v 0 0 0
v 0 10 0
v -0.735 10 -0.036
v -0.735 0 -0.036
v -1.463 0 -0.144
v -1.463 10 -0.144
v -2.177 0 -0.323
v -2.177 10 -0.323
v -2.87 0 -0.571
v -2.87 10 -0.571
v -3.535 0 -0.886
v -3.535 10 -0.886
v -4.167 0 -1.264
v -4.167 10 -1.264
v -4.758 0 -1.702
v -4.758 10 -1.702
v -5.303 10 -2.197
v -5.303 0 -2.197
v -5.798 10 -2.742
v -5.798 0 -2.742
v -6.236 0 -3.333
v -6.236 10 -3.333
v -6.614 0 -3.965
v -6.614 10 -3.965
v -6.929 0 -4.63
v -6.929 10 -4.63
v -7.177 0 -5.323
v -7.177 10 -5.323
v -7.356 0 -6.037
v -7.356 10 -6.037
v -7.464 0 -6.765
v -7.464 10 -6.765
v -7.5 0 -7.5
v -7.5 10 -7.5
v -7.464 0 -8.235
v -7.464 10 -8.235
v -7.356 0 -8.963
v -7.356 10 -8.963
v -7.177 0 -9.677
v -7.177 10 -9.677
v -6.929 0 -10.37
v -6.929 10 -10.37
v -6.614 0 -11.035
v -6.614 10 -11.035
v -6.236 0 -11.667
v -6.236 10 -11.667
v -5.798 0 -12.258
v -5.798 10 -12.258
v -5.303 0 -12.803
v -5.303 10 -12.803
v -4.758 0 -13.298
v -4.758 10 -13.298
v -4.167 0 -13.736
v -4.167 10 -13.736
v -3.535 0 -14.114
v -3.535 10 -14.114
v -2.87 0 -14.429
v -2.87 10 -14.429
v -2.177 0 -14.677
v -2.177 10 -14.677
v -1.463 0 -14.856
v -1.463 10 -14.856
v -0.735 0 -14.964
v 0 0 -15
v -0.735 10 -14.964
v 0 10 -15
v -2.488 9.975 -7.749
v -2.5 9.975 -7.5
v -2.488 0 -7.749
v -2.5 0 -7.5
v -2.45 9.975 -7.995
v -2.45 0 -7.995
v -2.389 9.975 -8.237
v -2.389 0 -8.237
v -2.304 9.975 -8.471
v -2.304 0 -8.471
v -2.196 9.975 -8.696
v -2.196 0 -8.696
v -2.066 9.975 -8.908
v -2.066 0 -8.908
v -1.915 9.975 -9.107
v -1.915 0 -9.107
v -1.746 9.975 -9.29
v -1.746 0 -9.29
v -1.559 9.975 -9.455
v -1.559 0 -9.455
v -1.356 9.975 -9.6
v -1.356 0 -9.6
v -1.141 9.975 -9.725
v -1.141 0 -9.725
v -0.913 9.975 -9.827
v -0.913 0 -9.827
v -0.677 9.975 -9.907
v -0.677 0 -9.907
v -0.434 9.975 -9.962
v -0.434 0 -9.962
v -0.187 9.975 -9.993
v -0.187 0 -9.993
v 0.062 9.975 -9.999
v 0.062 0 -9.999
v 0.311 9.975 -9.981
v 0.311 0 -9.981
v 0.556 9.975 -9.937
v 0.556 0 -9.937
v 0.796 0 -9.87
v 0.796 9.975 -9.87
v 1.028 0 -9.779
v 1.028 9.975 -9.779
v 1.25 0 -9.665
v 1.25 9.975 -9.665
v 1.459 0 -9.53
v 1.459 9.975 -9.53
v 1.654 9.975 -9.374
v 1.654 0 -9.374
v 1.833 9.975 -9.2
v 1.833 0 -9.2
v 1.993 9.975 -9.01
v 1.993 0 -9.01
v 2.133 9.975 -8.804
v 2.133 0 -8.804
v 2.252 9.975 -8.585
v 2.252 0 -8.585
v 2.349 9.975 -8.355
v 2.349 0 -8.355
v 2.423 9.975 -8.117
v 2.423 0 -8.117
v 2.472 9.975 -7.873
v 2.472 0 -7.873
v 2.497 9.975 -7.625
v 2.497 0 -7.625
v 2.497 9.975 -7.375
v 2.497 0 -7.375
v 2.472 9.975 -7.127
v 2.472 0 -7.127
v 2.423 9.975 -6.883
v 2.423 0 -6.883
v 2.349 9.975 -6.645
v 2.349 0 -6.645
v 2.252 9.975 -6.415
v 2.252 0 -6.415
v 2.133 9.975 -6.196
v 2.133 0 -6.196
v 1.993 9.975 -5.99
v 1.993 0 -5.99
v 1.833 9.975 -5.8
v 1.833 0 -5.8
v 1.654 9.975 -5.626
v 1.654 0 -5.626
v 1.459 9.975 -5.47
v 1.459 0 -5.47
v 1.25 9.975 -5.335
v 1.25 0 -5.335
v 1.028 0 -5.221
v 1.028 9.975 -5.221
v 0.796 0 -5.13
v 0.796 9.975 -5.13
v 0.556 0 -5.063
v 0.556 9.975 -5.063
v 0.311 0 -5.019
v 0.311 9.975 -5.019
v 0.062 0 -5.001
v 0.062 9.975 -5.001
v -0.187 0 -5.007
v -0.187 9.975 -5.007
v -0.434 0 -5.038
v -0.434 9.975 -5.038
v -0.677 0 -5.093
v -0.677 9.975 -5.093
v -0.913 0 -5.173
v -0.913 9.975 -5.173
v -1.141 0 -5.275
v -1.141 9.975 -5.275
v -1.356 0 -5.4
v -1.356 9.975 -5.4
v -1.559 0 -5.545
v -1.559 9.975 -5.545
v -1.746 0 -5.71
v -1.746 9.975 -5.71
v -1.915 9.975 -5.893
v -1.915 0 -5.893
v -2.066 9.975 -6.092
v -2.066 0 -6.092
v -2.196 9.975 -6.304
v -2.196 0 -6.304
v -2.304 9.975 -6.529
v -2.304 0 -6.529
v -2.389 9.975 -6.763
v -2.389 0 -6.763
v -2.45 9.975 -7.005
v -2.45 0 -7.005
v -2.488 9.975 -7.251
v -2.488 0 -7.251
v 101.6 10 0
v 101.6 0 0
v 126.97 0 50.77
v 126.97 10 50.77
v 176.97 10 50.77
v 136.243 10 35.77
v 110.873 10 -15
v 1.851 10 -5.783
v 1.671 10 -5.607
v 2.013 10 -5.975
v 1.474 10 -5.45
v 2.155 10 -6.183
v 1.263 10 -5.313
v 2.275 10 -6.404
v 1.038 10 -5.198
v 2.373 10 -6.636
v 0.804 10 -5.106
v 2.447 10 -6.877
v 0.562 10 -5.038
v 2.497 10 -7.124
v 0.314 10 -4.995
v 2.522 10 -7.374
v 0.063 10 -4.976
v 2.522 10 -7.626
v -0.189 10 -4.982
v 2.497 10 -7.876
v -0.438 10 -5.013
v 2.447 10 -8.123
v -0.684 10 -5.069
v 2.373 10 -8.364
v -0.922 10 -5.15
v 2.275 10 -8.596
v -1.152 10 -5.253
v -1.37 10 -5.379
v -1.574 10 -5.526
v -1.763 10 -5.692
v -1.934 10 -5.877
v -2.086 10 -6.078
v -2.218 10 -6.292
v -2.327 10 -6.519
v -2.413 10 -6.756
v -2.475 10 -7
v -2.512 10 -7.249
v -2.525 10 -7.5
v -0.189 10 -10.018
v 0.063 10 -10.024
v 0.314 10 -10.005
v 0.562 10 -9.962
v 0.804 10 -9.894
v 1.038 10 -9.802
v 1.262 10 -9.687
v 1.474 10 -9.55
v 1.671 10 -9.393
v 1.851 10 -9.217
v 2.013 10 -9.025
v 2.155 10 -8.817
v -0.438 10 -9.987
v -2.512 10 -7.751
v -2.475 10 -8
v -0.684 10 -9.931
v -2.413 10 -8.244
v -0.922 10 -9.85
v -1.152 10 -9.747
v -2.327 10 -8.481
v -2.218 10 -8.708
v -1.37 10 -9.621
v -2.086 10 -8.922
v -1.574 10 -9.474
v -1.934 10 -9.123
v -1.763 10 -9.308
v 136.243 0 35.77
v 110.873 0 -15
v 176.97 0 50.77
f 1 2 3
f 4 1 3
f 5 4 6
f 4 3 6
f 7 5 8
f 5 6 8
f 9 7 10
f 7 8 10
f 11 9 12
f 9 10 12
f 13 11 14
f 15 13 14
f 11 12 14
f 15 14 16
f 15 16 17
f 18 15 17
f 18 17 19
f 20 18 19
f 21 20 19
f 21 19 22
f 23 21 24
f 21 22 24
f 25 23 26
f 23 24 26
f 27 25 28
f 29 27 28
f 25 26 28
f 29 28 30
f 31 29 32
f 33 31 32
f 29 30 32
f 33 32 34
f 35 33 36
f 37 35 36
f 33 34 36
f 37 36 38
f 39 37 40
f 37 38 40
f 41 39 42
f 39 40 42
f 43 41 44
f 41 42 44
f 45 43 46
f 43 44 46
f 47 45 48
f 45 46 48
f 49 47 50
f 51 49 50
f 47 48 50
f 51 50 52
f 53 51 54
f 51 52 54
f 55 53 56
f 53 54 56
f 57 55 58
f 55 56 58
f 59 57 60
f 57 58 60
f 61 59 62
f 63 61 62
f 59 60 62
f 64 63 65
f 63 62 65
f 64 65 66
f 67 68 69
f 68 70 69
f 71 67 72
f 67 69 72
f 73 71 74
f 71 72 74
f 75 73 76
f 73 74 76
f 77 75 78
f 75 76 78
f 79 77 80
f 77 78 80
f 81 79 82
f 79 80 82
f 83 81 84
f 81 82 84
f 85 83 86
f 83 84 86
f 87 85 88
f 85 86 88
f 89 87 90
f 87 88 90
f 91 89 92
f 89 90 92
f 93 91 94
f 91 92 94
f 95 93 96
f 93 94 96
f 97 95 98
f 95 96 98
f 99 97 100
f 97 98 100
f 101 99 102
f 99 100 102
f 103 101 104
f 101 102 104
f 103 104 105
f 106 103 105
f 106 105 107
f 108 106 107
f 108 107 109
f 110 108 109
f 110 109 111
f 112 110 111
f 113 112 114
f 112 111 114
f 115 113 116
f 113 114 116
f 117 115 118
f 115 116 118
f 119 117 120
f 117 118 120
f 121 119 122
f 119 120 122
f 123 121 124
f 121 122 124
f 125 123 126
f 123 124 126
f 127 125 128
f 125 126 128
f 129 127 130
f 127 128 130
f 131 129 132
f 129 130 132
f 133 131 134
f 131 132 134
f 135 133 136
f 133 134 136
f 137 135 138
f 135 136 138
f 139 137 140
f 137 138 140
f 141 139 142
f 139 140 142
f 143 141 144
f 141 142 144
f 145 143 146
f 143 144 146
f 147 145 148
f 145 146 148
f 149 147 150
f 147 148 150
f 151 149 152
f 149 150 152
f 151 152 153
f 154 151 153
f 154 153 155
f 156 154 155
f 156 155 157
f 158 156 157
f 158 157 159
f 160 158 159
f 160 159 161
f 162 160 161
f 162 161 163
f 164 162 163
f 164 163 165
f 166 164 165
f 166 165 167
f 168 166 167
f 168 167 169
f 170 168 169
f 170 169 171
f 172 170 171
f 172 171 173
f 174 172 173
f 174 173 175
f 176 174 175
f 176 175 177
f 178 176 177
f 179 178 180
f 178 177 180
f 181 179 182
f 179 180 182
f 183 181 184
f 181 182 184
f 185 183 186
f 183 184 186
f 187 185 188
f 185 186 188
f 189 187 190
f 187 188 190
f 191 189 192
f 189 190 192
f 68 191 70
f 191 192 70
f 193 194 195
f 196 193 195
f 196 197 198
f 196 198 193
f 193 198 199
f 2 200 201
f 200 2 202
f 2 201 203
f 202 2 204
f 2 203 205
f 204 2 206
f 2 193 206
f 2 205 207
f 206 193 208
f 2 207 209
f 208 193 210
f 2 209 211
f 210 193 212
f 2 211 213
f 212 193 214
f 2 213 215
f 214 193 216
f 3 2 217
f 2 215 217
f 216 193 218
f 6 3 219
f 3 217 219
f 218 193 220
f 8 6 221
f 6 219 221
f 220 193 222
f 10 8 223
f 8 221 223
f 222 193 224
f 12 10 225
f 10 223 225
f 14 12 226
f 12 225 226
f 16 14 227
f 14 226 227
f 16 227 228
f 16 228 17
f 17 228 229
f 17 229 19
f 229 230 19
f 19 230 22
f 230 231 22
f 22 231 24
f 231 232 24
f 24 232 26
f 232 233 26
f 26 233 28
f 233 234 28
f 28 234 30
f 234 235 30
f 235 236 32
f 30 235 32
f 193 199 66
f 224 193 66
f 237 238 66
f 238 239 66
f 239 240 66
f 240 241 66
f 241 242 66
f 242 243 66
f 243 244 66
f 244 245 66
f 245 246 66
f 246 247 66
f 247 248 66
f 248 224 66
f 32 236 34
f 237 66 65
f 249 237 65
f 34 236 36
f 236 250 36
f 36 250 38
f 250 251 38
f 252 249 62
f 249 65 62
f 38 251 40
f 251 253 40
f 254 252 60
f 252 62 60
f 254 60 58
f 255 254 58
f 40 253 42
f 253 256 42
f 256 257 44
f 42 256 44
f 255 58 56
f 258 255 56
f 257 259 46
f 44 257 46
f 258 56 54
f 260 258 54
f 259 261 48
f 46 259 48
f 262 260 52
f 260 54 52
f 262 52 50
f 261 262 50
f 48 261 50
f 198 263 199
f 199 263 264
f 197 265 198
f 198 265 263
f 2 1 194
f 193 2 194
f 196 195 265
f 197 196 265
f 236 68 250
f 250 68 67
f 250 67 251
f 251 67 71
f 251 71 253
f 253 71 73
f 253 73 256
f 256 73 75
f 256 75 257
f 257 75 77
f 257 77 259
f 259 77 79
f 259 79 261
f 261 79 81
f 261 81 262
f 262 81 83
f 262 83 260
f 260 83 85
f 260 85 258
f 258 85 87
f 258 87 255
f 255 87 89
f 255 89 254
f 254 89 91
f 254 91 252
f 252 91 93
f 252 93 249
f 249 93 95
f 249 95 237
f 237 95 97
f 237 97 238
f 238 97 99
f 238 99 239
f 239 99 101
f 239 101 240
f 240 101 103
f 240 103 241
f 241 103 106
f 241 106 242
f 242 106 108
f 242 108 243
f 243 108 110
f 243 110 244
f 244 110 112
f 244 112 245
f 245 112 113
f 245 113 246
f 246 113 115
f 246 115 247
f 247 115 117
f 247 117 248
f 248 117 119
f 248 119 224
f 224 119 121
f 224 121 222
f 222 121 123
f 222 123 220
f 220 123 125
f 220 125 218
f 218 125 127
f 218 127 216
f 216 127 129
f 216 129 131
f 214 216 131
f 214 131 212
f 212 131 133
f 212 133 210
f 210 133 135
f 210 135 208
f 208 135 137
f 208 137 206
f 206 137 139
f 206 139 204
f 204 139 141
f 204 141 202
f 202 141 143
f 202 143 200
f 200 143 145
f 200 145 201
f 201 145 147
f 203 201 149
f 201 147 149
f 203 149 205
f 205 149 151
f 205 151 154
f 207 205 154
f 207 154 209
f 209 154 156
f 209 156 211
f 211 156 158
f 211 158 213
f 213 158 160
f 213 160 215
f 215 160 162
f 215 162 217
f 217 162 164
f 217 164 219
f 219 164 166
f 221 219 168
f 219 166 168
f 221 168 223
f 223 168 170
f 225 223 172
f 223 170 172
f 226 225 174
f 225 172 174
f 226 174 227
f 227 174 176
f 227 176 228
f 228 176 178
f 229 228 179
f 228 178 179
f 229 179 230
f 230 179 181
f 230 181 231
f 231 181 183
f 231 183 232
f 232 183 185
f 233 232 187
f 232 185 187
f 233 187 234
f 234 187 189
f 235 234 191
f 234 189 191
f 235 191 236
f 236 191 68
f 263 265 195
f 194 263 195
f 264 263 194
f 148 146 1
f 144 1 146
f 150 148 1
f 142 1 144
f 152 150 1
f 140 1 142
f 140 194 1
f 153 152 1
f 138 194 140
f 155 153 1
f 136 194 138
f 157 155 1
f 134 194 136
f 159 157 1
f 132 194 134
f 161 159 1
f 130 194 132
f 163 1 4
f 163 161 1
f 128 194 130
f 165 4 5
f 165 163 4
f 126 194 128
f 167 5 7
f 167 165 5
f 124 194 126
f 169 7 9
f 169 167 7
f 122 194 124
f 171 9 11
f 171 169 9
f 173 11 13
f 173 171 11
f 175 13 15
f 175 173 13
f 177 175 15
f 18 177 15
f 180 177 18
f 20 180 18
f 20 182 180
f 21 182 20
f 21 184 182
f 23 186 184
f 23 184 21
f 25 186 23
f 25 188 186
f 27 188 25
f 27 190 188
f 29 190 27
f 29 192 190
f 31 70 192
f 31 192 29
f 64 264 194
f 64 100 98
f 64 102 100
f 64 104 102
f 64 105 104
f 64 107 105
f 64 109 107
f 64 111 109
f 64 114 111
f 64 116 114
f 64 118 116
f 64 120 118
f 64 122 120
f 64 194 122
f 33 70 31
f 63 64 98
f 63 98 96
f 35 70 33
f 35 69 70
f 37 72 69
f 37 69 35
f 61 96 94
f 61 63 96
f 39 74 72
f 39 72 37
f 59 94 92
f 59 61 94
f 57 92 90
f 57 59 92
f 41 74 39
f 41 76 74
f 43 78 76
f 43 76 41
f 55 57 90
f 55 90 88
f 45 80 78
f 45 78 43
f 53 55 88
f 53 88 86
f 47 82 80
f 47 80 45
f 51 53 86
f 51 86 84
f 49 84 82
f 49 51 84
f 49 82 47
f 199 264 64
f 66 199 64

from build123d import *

# Parameters (mm, degrees)
BOSS_EXTRUDE1_DEPTH             = 10
BOSS_EXTRUDE2_DEPTH             = 10
F_5_0MM_DOWEL_HOLE2_D           = 5
F_5_0MM_DOWEL_HOLE2_CSINK_D     = 5.05
F_5_0MM_DOWEL_HOLE2_CSINK_ANGLE = 90


with BuildPart() as part:
    # Sketch1 → Boss-Extrude1 (new body)
    with BuildSketch(Plane(origin=(0, 0, 0), x_dir=(1, 0, 0), z_dir=(0, 1, 0))):
        Polygon((0, 0), (101.6, 0), (126.970266889, -50.770266889), (176.970266889, -50.770266889), (136.243205185, -35.770266889), (110.872938296, 15), (0, 15), align=None)
    extrude(amount=BOSS_EXTRUDE1_DEPTH)

    # Sketch2 → Boss-Extrude2 (add)
    with BuildSketch(Plane(origin=(0, 10, 0), x_dir=(1, 0, 0), z_dir=(0, 1, 0))):
        with BuildLine():
            Line((0, 15), (0, 0))
            ThreePointArc((0, 0), (-7.5, 7.5), (0, 15))
        make_face()
    extrude(amount=-BOSS_EXTRUDE2_DEPTH)

    # Ø5.0mm Dowel Hole2 (through all)
    with Locations(Plane(origin=(0, 10, 0), x_dir=(1, 0, 0), z_dir=(0, 1, 0))):
        with Locations((0, 7.5)):
            CounterSinkHole(F_5_0MM_DOWEL_HOLE2_D / 2, F_5_0MM_DOWEL_HOLE2_CSINK_D / 2, counter_sink_angle=F_5_0MM_DOWEL_HOLE2_CSINK_ANGLE)


solid = part.part
